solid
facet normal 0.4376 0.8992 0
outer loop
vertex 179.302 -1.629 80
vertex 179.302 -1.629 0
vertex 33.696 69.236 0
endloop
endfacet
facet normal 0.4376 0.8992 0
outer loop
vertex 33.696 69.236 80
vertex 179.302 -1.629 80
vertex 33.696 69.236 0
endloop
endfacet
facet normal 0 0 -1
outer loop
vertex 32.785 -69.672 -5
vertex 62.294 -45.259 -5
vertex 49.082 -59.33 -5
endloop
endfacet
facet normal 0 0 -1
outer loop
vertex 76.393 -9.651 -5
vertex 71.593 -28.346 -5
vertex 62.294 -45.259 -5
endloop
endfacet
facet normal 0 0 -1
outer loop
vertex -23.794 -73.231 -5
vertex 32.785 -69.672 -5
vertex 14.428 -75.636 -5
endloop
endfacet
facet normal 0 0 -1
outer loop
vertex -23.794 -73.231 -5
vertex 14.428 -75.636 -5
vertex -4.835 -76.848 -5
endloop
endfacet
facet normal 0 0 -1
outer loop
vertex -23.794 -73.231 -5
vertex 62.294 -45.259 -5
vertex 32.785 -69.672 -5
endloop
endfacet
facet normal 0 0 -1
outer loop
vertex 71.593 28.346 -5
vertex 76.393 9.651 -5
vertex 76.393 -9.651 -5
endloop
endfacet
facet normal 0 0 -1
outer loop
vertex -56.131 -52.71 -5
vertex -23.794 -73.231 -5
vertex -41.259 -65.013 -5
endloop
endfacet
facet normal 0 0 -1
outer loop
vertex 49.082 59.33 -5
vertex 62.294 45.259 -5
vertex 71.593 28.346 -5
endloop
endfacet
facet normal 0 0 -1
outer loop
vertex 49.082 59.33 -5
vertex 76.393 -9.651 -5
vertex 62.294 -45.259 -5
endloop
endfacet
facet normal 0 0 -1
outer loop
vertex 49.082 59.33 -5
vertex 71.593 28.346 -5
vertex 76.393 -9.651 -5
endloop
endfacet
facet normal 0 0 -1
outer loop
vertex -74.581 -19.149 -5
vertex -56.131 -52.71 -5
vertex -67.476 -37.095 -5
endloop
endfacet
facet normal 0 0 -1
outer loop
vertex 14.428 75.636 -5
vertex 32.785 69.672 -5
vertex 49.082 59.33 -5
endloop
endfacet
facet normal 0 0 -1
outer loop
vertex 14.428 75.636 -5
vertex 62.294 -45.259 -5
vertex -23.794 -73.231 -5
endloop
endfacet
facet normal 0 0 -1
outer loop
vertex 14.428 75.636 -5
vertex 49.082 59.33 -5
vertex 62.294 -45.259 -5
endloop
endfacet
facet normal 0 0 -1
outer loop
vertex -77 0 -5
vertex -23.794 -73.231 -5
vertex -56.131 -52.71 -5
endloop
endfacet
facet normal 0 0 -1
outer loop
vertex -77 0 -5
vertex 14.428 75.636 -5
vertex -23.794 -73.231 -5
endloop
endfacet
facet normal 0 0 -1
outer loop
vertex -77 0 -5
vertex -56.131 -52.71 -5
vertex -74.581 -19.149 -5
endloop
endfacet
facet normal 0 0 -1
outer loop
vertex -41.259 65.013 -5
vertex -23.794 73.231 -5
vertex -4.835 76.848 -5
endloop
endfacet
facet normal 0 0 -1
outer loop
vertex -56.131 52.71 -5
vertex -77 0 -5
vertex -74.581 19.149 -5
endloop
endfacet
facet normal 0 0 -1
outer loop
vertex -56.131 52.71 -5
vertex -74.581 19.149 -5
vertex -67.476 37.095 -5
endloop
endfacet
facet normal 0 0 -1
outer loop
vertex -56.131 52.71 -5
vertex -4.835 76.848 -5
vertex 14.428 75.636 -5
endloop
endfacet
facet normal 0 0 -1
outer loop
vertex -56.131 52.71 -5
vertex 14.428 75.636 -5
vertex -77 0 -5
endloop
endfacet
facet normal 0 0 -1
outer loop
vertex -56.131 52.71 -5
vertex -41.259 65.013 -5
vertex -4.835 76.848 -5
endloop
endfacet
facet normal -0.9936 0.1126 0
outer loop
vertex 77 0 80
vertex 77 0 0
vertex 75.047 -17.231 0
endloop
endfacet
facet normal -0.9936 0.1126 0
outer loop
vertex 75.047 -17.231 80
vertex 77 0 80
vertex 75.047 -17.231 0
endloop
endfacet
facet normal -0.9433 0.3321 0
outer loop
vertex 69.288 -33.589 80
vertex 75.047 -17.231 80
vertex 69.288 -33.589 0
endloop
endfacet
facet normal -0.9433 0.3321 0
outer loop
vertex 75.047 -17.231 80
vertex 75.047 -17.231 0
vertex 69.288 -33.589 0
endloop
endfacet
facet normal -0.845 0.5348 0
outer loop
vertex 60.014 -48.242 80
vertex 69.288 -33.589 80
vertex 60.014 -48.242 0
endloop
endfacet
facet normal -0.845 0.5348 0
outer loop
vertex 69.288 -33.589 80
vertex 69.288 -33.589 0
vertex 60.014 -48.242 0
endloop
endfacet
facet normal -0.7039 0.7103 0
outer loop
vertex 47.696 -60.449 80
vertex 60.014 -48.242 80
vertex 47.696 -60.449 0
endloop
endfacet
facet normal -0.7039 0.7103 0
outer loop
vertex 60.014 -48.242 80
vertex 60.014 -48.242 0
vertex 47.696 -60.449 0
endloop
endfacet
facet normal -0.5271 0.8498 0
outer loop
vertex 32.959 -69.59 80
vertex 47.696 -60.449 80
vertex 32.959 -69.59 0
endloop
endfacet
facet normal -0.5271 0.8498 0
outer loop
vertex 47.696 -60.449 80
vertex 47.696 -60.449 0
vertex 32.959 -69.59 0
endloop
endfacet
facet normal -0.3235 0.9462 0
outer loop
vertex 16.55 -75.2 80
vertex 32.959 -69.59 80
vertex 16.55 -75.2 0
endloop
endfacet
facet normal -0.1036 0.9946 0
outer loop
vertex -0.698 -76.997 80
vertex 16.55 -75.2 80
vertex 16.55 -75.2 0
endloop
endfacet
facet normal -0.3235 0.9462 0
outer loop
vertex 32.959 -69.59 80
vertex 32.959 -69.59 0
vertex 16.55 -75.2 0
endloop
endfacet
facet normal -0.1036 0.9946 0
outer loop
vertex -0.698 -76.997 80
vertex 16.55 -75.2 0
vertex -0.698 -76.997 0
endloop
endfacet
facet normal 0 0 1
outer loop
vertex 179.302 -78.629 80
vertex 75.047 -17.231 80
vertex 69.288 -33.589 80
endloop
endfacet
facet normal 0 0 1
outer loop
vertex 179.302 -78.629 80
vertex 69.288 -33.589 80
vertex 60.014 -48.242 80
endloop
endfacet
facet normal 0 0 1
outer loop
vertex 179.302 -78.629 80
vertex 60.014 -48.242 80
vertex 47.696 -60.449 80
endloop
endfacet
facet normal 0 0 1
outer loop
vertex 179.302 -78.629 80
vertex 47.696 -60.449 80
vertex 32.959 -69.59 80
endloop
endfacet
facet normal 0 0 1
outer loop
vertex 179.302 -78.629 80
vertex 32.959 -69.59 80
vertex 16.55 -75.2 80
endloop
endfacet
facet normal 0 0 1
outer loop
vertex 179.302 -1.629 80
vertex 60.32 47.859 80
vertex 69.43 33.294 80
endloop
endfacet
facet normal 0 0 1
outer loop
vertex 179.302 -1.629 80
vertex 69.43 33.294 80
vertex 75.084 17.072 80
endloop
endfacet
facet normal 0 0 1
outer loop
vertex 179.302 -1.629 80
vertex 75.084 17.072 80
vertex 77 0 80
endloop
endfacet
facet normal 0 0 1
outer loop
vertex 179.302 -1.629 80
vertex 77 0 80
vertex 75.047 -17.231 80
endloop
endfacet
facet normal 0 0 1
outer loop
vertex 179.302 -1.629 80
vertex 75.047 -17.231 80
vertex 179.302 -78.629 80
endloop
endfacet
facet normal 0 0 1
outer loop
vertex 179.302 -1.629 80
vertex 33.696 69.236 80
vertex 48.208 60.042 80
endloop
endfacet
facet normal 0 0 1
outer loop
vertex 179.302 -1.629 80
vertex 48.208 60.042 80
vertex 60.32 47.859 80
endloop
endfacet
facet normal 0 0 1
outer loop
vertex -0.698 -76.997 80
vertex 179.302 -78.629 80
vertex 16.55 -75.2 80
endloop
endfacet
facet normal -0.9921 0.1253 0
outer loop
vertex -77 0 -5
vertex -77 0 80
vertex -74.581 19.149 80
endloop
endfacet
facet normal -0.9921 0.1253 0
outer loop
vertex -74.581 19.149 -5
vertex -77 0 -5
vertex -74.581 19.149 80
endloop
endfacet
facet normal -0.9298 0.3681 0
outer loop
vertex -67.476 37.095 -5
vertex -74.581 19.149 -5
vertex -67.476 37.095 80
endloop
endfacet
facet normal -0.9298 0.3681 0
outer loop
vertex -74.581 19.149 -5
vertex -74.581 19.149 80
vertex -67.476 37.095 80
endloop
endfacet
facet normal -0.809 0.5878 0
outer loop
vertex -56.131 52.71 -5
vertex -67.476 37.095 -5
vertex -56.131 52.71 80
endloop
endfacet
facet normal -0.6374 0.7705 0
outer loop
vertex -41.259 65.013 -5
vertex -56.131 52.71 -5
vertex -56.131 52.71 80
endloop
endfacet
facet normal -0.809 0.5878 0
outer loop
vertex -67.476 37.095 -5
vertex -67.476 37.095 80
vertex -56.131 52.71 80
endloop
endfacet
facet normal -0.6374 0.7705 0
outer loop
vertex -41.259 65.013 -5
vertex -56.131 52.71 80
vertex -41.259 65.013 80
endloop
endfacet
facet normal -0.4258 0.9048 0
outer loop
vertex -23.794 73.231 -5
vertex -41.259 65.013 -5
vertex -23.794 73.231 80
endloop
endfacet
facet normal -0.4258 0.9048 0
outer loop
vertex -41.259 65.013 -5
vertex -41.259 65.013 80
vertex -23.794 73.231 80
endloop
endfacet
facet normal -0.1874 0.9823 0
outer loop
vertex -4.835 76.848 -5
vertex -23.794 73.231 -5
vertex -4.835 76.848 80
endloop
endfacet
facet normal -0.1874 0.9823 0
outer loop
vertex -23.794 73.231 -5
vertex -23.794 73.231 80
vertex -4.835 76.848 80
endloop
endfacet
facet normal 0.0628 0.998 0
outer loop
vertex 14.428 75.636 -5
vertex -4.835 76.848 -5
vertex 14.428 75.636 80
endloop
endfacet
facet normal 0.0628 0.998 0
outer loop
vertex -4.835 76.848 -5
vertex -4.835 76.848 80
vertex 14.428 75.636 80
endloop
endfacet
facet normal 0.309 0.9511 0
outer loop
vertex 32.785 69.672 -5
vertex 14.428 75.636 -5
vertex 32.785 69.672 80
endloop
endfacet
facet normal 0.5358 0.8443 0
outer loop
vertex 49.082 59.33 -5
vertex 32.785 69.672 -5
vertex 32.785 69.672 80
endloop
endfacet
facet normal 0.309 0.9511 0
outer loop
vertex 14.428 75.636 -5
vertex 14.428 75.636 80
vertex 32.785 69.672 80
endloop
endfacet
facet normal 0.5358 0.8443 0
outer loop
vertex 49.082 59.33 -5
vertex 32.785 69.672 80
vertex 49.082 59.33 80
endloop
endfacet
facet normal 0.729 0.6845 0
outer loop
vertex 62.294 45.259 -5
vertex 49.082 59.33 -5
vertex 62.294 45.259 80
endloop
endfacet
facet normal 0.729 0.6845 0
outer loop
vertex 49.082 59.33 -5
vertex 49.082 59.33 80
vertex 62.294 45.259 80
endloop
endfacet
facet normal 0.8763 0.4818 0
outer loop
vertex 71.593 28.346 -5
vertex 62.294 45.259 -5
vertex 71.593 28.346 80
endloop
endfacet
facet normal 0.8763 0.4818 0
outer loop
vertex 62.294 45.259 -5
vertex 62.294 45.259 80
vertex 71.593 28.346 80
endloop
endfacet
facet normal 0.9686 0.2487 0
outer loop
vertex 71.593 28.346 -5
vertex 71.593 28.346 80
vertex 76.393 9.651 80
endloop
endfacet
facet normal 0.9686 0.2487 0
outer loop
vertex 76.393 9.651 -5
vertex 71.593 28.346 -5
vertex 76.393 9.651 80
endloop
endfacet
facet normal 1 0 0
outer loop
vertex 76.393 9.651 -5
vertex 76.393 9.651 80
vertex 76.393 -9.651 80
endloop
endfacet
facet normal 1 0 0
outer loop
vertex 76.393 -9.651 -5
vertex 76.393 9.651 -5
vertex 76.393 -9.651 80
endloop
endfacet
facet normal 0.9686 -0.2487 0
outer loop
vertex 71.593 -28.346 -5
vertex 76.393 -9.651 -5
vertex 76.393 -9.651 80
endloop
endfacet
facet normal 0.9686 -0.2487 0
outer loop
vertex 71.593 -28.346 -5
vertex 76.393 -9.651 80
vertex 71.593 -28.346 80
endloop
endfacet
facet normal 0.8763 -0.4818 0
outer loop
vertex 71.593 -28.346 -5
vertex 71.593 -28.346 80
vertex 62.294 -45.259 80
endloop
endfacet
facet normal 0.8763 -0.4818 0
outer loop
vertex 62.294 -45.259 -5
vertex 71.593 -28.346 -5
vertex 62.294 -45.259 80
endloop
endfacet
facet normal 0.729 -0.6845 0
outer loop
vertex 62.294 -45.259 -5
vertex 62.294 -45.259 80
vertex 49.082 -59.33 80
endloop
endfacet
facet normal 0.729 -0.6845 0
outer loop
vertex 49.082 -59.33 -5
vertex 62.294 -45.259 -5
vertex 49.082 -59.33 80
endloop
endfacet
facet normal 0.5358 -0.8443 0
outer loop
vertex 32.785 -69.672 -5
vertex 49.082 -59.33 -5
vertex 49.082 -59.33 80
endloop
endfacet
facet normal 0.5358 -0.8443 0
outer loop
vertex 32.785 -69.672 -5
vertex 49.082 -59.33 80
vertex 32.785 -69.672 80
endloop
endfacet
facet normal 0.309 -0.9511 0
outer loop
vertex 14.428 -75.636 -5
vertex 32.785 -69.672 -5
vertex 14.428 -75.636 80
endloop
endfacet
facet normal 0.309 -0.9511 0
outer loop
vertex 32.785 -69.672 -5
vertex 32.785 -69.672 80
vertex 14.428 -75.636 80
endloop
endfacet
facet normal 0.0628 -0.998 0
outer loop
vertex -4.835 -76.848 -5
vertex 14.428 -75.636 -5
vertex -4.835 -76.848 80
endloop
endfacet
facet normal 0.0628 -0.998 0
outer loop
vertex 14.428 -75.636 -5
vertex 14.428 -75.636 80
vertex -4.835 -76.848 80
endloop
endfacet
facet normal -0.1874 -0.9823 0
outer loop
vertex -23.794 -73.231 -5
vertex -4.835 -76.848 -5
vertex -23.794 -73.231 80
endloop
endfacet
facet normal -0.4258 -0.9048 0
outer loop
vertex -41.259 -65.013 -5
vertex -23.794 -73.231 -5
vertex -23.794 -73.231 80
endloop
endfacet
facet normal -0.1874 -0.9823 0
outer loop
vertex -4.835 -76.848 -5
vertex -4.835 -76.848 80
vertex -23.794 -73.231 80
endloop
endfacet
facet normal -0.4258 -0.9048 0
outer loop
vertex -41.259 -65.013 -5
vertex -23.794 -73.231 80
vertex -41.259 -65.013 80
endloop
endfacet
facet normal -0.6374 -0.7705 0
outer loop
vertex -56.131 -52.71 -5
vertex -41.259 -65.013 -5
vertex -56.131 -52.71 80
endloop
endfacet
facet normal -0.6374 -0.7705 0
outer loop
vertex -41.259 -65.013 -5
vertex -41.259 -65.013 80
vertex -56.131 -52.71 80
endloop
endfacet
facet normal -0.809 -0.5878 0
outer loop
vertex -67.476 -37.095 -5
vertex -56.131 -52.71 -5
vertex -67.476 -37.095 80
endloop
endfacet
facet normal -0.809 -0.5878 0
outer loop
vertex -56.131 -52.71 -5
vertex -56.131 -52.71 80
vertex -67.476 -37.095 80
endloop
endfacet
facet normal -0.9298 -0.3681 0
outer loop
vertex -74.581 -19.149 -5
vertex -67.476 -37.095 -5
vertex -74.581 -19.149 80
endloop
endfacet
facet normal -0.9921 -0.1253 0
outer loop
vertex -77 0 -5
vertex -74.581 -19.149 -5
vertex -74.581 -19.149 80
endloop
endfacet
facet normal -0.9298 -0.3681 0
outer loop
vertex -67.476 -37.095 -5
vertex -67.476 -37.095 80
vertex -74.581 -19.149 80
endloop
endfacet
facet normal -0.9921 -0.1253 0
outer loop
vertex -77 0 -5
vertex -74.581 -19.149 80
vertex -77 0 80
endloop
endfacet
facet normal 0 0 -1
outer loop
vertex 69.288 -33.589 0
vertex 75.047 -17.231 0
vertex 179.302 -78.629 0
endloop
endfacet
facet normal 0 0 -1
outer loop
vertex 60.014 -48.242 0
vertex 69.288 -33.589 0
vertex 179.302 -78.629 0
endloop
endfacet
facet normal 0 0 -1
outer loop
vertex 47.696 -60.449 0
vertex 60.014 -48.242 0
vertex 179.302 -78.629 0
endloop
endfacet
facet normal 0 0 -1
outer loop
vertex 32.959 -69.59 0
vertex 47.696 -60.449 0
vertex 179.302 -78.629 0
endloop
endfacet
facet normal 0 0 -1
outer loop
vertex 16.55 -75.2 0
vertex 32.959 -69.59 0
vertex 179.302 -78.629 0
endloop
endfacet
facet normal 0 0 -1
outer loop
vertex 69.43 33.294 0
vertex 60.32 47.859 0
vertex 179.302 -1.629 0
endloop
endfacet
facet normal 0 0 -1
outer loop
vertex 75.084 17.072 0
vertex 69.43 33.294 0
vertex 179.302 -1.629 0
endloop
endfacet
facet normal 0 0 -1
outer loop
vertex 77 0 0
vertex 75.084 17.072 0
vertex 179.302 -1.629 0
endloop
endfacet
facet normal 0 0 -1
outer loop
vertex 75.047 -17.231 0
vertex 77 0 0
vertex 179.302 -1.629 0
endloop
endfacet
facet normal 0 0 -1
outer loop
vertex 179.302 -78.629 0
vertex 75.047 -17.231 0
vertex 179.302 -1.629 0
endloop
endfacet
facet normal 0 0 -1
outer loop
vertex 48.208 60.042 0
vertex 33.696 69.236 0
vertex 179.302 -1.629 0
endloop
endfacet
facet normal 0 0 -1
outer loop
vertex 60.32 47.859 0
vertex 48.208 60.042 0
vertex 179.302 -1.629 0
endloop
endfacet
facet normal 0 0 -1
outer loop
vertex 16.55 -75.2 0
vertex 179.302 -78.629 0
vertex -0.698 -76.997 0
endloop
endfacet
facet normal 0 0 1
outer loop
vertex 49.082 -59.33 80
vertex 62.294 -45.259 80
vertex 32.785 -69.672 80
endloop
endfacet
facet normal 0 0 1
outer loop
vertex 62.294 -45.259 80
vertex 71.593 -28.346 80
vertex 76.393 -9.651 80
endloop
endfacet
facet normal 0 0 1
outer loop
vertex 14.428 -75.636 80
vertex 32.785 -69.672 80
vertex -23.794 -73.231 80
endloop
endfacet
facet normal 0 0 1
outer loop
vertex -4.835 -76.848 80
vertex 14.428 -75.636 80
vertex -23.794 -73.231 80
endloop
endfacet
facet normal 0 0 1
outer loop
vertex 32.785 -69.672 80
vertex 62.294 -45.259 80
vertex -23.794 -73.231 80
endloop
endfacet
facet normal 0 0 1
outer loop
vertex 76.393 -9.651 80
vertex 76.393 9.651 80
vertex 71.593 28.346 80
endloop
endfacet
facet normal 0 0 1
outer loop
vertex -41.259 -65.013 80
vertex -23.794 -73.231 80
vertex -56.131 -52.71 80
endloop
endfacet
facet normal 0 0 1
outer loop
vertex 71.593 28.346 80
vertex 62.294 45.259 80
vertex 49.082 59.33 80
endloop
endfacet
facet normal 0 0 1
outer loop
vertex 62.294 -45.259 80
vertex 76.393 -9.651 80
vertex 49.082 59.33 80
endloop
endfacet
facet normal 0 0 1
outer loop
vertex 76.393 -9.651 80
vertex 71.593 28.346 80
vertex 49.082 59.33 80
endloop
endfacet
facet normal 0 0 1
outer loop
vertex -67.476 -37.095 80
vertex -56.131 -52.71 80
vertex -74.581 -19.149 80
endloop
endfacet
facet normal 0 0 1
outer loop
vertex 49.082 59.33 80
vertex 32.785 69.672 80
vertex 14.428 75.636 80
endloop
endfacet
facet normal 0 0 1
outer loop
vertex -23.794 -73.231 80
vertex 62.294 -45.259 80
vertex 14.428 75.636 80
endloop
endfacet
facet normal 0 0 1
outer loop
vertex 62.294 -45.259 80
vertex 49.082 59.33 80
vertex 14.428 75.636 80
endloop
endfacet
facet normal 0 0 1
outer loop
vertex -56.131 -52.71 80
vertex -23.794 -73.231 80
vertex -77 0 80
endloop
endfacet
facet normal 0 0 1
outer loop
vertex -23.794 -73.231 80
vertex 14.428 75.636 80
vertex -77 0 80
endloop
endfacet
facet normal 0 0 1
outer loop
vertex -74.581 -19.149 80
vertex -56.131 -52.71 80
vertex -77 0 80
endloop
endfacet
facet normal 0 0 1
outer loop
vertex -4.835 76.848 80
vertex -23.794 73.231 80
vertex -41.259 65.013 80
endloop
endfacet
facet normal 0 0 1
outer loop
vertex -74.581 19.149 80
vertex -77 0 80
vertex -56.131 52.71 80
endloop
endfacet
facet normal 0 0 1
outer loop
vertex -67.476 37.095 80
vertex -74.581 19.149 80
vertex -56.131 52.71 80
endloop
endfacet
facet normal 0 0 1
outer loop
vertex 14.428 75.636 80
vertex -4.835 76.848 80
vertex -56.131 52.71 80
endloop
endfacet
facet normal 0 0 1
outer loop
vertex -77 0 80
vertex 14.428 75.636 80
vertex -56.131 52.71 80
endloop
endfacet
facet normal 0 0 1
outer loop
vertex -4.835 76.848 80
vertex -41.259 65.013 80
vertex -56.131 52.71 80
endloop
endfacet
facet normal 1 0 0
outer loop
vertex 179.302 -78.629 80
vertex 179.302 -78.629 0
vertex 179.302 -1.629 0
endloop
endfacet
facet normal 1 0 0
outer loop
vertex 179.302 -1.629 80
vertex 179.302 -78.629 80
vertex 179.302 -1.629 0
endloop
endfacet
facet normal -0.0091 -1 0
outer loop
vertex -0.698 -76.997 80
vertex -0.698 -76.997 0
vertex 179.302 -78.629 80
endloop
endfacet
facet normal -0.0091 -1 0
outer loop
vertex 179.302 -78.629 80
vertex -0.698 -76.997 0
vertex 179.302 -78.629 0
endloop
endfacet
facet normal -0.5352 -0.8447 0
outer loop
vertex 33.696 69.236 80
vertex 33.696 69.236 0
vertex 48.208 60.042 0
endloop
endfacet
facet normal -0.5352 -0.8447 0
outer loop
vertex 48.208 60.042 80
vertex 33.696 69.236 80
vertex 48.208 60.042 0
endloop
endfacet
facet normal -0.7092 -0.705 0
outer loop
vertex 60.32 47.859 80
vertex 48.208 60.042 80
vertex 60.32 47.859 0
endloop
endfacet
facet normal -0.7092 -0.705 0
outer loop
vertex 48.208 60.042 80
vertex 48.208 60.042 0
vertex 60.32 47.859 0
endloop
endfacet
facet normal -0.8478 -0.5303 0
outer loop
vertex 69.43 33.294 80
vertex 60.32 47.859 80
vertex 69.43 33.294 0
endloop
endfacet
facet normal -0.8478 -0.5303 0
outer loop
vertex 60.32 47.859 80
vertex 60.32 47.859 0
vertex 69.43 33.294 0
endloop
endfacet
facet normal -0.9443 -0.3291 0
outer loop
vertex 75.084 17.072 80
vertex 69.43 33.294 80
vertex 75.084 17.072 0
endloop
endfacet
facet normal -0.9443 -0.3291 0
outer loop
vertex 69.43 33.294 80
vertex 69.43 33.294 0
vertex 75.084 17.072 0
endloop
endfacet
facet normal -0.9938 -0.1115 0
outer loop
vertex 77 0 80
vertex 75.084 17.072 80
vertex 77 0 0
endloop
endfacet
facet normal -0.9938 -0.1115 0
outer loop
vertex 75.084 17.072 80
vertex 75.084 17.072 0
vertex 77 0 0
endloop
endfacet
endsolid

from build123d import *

# Parameters (mm, degrees)
BOSS_EXTRUDE3_DEPTH      = 80
BOSS_EXTRUDE4_DEPTH      = 5
BOSS_EXTRUDE4_DEPTH_BACK = 80
SKETCH4_R                = 77


with BuildPart() as part:
    # Sketch2 → Boss-Extrude3 (new body)
    with BuildSketch(Plane.XY):
        with BuildLine():
            Line((179.301743725, -78.629188464), (179.301743725, -1.629188422))
            Line((179.301743725, -1.629188422), (33.69625772, 69.235556007))
            ThreePointArc((33.69625772, 69.235556007), (65.282508547, 40.831287976), (77, 0))
            ThreePointArc((77, 0), (54.199789053, -54.693535876), (-0.698256275, -76.996833949))
            Line((-0.698256275, -76.996833949), (179.301743725, -78.629188464))
        make_face()
    extrude(amount=BOSS_EXTRUDE3_DEPTH)


with BuildPart() as body_2:
    # Sketch4 → Boss-Extrude4 (new, two sides: drawn at the far end of the back side and taken through both)
    with BuildSketch(Plane(origin=(0, 0, 0), x_dir=(-1, 0, 0), z_dir=(0, 0, -1)).offset(-BOSS_EXTRUDE4_DEPTH_BACK)):
        Circle(SKETCH4_R)
    extrude(amount=BOSS_EXTRUDE4_DEPTH + BOSS_EXTRUDE4_DEPTH_BACK)


solid = Compound([part.part, body_2.part])
